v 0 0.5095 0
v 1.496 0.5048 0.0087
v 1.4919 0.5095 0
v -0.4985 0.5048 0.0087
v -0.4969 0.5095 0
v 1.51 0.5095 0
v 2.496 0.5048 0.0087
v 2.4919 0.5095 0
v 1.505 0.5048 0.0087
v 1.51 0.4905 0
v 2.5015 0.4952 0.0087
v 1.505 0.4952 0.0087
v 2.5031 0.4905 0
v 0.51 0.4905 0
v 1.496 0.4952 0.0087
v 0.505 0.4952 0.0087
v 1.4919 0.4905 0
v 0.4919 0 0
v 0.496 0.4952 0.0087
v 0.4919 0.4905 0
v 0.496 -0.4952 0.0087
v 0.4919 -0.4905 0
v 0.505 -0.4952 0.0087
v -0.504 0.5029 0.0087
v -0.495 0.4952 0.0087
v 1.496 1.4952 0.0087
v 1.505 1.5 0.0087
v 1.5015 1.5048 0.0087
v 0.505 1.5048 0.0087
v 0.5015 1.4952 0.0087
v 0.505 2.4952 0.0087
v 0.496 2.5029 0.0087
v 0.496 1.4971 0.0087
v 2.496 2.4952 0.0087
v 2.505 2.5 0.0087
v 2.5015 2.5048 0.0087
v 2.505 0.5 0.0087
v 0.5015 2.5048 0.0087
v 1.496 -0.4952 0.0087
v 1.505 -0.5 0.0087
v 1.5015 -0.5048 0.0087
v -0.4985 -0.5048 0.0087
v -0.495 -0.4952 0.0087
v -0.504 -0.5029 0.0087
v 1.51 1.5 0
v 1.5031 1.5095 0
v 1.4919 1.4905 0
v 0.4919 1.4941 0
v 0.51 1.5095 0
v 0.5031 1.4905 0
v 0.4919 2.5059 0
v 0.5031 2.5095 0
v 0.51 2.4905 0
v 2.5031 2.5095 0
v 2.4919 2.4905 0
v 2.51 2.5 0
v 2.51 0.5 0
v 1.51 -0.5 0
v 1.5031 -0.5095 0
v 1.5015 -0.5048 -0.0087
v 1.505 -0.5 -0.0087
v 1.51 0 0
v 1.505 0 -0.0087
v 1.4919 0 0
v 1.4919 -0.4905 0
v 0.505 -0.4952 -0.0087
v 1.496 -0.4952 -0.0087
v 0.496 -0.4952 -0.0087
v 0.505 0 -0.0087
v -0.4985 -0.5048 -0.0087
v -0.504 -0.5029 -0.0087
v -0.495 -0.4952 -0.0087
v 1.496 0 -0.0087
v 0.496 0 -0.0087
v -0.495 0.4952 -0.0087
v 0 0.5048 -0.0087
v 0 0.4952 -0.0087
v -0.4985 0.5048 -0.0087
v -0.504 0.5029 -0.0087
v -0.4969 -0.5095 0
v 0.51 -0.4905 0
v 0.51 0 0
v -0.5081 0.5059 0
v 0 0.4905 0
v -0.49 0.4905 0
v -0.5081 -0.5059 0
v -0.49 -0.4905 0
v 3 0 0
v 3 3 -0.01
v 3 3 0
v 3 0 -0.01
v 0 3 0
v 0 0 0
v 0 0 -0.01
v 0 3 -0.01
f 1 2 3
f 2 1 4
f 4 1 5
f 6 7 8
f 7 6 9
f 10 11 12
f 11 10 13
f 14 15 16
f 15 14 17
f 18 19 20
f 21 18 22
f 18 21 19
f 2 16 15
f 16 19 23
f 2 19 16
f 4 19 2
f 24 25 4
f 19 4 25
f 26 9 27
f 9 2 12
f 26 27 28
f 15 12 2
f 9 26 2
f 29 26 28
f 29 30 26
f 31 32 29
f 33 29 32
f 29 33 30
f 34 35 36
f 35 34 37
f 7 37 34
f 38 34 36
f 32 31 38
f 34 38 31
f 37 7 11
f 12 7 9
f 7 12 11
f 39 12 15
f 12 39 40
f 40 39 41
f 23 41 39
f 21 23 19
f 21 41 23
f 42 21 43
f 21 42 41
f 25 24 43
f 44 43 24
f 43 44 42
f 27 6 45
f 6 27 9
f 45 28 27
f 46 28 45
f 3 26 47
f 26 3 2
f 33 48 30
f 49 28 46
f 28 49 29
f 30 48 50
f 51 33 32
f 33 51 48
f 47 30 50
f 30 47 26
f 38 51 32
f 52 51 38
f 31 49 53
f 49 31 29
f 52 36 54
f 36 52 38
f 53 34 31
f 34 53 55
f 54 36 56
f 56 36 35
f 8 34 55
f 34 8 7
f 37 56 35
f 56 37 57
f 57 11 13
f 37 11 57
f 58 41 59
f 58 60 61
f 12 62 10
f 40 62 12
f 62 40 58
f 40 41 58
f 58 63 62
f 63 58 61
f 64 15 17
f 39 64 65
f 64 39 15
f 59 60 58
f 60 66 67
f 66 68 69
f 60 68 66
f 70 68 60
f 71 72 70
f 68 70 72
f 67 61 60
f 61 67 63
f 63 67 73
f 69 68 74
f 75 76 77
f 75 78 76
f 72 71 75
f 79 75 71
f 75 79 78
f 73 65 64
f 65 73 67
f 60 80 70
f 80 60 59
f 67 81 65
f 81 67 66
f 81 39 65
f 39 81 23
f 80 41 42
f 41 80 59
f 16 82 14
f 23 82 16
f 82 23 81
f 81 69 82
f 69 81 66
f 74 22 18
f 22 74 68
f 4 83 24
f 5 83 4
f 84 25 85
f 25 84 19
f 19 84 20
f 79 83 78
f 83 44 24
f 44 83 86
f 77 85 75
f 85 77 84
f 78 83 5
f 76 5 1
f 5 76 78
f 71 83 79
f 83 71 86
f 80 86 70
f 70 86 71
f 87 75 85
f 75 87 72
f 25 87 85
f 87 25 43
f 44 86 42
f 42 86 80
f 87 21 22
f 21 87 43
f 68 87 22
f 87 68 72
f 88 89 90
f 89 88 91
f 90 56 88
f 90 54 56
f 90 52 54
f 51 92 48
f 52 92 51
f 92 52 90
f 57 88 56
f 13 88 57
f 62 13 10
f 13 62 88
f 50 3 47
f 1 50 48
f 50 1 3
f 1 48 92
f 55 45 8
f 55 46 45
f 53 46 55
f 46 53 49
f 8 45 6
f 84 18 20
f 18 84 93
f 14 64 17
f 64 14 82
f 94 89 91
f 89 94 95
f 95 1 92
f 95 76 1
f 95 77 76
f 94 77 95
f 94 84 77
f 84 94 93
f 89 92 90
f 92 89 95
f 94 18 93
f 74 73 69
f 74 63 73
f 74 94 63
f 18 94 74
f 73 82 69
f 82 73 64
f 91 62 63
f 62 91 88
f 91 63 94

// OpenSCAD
hull(){
    translate([0.5, 0.5]) sphere(0.01);
    translate([1.5, 0.5]) sphere(0.01);
}
hull(){
    translate([1.5, 0.5]) sphere(0.01);
    translate([1.5, 1.5]) sphere(0.01);
}
hull(){
    translate([1.5, 1.5]) sphere(0.01);
    translate([0.5, 1.5]) sphere(0.01);
}
hull(){
    translate([0.5, 1.5]) sphere(0.01);
    translate([0.5, 2.5]) sphere(0.01);
}
hull(){
    translate([0.5, 2.5]) sphere(0.01);
    translate([1.5, 2.5]) sphere(0.01);
}
hull(){
    translate([1.5, 2.5]) sphere(0.01);
    translate([2.5, 2.5]) sphere(0.01);
}
hull(){
    translate([2.5, 2.5]) sphere(0.01);
    translate([2.5, 1.5]) sphere(0.01);
}
hull(){
    translate([2.5, 1.5]) sphere(0.01);
    translate([2.5, 0.5]) sphere(0.01);
}
hull(){
    translate([2.5, 0.5]) sphere(0.01);
    translate([1.5, 0.5]) sphere(0.01);
}
hull(){
    translate([1.5, 0.5]) sphere(0.01);
    translate([1.5, -0.5]) sphere(0.01);
}
hull(){
    translate([1.5, -0.5]) sphere(0.01);
    translate([0.5, -0.5]) sphere(0.01);
}
hull(){
    translate([0.5, -0.5]) sphere(0.01);
    translate([0.5, 0.5]) sphere(0.01);
}
hull(){
    translate([0.5, 0.5]) sphere(0.01);
    translate([-0.5, 0.5]) sphere(0.01);
}
hull(){
    translate([-0.5, 0.5]) sphere(0.01);
    translate([-0.5, -0.5]) sphere(0.01);
}
hull(){
    translate([-0.5, -0.5]) sphere(0.01);
    translate([0.5, -0.5]) sphere(0.01);
}
hull(){
    translate([0.5, -0.5]) sphere(0.01);
    translate([0.5, 0.5]) sphere(0.01);
}
translate([0,0,-0.01]) color([0.1,0.1,0.1]) cube([3,3,0.01]);
